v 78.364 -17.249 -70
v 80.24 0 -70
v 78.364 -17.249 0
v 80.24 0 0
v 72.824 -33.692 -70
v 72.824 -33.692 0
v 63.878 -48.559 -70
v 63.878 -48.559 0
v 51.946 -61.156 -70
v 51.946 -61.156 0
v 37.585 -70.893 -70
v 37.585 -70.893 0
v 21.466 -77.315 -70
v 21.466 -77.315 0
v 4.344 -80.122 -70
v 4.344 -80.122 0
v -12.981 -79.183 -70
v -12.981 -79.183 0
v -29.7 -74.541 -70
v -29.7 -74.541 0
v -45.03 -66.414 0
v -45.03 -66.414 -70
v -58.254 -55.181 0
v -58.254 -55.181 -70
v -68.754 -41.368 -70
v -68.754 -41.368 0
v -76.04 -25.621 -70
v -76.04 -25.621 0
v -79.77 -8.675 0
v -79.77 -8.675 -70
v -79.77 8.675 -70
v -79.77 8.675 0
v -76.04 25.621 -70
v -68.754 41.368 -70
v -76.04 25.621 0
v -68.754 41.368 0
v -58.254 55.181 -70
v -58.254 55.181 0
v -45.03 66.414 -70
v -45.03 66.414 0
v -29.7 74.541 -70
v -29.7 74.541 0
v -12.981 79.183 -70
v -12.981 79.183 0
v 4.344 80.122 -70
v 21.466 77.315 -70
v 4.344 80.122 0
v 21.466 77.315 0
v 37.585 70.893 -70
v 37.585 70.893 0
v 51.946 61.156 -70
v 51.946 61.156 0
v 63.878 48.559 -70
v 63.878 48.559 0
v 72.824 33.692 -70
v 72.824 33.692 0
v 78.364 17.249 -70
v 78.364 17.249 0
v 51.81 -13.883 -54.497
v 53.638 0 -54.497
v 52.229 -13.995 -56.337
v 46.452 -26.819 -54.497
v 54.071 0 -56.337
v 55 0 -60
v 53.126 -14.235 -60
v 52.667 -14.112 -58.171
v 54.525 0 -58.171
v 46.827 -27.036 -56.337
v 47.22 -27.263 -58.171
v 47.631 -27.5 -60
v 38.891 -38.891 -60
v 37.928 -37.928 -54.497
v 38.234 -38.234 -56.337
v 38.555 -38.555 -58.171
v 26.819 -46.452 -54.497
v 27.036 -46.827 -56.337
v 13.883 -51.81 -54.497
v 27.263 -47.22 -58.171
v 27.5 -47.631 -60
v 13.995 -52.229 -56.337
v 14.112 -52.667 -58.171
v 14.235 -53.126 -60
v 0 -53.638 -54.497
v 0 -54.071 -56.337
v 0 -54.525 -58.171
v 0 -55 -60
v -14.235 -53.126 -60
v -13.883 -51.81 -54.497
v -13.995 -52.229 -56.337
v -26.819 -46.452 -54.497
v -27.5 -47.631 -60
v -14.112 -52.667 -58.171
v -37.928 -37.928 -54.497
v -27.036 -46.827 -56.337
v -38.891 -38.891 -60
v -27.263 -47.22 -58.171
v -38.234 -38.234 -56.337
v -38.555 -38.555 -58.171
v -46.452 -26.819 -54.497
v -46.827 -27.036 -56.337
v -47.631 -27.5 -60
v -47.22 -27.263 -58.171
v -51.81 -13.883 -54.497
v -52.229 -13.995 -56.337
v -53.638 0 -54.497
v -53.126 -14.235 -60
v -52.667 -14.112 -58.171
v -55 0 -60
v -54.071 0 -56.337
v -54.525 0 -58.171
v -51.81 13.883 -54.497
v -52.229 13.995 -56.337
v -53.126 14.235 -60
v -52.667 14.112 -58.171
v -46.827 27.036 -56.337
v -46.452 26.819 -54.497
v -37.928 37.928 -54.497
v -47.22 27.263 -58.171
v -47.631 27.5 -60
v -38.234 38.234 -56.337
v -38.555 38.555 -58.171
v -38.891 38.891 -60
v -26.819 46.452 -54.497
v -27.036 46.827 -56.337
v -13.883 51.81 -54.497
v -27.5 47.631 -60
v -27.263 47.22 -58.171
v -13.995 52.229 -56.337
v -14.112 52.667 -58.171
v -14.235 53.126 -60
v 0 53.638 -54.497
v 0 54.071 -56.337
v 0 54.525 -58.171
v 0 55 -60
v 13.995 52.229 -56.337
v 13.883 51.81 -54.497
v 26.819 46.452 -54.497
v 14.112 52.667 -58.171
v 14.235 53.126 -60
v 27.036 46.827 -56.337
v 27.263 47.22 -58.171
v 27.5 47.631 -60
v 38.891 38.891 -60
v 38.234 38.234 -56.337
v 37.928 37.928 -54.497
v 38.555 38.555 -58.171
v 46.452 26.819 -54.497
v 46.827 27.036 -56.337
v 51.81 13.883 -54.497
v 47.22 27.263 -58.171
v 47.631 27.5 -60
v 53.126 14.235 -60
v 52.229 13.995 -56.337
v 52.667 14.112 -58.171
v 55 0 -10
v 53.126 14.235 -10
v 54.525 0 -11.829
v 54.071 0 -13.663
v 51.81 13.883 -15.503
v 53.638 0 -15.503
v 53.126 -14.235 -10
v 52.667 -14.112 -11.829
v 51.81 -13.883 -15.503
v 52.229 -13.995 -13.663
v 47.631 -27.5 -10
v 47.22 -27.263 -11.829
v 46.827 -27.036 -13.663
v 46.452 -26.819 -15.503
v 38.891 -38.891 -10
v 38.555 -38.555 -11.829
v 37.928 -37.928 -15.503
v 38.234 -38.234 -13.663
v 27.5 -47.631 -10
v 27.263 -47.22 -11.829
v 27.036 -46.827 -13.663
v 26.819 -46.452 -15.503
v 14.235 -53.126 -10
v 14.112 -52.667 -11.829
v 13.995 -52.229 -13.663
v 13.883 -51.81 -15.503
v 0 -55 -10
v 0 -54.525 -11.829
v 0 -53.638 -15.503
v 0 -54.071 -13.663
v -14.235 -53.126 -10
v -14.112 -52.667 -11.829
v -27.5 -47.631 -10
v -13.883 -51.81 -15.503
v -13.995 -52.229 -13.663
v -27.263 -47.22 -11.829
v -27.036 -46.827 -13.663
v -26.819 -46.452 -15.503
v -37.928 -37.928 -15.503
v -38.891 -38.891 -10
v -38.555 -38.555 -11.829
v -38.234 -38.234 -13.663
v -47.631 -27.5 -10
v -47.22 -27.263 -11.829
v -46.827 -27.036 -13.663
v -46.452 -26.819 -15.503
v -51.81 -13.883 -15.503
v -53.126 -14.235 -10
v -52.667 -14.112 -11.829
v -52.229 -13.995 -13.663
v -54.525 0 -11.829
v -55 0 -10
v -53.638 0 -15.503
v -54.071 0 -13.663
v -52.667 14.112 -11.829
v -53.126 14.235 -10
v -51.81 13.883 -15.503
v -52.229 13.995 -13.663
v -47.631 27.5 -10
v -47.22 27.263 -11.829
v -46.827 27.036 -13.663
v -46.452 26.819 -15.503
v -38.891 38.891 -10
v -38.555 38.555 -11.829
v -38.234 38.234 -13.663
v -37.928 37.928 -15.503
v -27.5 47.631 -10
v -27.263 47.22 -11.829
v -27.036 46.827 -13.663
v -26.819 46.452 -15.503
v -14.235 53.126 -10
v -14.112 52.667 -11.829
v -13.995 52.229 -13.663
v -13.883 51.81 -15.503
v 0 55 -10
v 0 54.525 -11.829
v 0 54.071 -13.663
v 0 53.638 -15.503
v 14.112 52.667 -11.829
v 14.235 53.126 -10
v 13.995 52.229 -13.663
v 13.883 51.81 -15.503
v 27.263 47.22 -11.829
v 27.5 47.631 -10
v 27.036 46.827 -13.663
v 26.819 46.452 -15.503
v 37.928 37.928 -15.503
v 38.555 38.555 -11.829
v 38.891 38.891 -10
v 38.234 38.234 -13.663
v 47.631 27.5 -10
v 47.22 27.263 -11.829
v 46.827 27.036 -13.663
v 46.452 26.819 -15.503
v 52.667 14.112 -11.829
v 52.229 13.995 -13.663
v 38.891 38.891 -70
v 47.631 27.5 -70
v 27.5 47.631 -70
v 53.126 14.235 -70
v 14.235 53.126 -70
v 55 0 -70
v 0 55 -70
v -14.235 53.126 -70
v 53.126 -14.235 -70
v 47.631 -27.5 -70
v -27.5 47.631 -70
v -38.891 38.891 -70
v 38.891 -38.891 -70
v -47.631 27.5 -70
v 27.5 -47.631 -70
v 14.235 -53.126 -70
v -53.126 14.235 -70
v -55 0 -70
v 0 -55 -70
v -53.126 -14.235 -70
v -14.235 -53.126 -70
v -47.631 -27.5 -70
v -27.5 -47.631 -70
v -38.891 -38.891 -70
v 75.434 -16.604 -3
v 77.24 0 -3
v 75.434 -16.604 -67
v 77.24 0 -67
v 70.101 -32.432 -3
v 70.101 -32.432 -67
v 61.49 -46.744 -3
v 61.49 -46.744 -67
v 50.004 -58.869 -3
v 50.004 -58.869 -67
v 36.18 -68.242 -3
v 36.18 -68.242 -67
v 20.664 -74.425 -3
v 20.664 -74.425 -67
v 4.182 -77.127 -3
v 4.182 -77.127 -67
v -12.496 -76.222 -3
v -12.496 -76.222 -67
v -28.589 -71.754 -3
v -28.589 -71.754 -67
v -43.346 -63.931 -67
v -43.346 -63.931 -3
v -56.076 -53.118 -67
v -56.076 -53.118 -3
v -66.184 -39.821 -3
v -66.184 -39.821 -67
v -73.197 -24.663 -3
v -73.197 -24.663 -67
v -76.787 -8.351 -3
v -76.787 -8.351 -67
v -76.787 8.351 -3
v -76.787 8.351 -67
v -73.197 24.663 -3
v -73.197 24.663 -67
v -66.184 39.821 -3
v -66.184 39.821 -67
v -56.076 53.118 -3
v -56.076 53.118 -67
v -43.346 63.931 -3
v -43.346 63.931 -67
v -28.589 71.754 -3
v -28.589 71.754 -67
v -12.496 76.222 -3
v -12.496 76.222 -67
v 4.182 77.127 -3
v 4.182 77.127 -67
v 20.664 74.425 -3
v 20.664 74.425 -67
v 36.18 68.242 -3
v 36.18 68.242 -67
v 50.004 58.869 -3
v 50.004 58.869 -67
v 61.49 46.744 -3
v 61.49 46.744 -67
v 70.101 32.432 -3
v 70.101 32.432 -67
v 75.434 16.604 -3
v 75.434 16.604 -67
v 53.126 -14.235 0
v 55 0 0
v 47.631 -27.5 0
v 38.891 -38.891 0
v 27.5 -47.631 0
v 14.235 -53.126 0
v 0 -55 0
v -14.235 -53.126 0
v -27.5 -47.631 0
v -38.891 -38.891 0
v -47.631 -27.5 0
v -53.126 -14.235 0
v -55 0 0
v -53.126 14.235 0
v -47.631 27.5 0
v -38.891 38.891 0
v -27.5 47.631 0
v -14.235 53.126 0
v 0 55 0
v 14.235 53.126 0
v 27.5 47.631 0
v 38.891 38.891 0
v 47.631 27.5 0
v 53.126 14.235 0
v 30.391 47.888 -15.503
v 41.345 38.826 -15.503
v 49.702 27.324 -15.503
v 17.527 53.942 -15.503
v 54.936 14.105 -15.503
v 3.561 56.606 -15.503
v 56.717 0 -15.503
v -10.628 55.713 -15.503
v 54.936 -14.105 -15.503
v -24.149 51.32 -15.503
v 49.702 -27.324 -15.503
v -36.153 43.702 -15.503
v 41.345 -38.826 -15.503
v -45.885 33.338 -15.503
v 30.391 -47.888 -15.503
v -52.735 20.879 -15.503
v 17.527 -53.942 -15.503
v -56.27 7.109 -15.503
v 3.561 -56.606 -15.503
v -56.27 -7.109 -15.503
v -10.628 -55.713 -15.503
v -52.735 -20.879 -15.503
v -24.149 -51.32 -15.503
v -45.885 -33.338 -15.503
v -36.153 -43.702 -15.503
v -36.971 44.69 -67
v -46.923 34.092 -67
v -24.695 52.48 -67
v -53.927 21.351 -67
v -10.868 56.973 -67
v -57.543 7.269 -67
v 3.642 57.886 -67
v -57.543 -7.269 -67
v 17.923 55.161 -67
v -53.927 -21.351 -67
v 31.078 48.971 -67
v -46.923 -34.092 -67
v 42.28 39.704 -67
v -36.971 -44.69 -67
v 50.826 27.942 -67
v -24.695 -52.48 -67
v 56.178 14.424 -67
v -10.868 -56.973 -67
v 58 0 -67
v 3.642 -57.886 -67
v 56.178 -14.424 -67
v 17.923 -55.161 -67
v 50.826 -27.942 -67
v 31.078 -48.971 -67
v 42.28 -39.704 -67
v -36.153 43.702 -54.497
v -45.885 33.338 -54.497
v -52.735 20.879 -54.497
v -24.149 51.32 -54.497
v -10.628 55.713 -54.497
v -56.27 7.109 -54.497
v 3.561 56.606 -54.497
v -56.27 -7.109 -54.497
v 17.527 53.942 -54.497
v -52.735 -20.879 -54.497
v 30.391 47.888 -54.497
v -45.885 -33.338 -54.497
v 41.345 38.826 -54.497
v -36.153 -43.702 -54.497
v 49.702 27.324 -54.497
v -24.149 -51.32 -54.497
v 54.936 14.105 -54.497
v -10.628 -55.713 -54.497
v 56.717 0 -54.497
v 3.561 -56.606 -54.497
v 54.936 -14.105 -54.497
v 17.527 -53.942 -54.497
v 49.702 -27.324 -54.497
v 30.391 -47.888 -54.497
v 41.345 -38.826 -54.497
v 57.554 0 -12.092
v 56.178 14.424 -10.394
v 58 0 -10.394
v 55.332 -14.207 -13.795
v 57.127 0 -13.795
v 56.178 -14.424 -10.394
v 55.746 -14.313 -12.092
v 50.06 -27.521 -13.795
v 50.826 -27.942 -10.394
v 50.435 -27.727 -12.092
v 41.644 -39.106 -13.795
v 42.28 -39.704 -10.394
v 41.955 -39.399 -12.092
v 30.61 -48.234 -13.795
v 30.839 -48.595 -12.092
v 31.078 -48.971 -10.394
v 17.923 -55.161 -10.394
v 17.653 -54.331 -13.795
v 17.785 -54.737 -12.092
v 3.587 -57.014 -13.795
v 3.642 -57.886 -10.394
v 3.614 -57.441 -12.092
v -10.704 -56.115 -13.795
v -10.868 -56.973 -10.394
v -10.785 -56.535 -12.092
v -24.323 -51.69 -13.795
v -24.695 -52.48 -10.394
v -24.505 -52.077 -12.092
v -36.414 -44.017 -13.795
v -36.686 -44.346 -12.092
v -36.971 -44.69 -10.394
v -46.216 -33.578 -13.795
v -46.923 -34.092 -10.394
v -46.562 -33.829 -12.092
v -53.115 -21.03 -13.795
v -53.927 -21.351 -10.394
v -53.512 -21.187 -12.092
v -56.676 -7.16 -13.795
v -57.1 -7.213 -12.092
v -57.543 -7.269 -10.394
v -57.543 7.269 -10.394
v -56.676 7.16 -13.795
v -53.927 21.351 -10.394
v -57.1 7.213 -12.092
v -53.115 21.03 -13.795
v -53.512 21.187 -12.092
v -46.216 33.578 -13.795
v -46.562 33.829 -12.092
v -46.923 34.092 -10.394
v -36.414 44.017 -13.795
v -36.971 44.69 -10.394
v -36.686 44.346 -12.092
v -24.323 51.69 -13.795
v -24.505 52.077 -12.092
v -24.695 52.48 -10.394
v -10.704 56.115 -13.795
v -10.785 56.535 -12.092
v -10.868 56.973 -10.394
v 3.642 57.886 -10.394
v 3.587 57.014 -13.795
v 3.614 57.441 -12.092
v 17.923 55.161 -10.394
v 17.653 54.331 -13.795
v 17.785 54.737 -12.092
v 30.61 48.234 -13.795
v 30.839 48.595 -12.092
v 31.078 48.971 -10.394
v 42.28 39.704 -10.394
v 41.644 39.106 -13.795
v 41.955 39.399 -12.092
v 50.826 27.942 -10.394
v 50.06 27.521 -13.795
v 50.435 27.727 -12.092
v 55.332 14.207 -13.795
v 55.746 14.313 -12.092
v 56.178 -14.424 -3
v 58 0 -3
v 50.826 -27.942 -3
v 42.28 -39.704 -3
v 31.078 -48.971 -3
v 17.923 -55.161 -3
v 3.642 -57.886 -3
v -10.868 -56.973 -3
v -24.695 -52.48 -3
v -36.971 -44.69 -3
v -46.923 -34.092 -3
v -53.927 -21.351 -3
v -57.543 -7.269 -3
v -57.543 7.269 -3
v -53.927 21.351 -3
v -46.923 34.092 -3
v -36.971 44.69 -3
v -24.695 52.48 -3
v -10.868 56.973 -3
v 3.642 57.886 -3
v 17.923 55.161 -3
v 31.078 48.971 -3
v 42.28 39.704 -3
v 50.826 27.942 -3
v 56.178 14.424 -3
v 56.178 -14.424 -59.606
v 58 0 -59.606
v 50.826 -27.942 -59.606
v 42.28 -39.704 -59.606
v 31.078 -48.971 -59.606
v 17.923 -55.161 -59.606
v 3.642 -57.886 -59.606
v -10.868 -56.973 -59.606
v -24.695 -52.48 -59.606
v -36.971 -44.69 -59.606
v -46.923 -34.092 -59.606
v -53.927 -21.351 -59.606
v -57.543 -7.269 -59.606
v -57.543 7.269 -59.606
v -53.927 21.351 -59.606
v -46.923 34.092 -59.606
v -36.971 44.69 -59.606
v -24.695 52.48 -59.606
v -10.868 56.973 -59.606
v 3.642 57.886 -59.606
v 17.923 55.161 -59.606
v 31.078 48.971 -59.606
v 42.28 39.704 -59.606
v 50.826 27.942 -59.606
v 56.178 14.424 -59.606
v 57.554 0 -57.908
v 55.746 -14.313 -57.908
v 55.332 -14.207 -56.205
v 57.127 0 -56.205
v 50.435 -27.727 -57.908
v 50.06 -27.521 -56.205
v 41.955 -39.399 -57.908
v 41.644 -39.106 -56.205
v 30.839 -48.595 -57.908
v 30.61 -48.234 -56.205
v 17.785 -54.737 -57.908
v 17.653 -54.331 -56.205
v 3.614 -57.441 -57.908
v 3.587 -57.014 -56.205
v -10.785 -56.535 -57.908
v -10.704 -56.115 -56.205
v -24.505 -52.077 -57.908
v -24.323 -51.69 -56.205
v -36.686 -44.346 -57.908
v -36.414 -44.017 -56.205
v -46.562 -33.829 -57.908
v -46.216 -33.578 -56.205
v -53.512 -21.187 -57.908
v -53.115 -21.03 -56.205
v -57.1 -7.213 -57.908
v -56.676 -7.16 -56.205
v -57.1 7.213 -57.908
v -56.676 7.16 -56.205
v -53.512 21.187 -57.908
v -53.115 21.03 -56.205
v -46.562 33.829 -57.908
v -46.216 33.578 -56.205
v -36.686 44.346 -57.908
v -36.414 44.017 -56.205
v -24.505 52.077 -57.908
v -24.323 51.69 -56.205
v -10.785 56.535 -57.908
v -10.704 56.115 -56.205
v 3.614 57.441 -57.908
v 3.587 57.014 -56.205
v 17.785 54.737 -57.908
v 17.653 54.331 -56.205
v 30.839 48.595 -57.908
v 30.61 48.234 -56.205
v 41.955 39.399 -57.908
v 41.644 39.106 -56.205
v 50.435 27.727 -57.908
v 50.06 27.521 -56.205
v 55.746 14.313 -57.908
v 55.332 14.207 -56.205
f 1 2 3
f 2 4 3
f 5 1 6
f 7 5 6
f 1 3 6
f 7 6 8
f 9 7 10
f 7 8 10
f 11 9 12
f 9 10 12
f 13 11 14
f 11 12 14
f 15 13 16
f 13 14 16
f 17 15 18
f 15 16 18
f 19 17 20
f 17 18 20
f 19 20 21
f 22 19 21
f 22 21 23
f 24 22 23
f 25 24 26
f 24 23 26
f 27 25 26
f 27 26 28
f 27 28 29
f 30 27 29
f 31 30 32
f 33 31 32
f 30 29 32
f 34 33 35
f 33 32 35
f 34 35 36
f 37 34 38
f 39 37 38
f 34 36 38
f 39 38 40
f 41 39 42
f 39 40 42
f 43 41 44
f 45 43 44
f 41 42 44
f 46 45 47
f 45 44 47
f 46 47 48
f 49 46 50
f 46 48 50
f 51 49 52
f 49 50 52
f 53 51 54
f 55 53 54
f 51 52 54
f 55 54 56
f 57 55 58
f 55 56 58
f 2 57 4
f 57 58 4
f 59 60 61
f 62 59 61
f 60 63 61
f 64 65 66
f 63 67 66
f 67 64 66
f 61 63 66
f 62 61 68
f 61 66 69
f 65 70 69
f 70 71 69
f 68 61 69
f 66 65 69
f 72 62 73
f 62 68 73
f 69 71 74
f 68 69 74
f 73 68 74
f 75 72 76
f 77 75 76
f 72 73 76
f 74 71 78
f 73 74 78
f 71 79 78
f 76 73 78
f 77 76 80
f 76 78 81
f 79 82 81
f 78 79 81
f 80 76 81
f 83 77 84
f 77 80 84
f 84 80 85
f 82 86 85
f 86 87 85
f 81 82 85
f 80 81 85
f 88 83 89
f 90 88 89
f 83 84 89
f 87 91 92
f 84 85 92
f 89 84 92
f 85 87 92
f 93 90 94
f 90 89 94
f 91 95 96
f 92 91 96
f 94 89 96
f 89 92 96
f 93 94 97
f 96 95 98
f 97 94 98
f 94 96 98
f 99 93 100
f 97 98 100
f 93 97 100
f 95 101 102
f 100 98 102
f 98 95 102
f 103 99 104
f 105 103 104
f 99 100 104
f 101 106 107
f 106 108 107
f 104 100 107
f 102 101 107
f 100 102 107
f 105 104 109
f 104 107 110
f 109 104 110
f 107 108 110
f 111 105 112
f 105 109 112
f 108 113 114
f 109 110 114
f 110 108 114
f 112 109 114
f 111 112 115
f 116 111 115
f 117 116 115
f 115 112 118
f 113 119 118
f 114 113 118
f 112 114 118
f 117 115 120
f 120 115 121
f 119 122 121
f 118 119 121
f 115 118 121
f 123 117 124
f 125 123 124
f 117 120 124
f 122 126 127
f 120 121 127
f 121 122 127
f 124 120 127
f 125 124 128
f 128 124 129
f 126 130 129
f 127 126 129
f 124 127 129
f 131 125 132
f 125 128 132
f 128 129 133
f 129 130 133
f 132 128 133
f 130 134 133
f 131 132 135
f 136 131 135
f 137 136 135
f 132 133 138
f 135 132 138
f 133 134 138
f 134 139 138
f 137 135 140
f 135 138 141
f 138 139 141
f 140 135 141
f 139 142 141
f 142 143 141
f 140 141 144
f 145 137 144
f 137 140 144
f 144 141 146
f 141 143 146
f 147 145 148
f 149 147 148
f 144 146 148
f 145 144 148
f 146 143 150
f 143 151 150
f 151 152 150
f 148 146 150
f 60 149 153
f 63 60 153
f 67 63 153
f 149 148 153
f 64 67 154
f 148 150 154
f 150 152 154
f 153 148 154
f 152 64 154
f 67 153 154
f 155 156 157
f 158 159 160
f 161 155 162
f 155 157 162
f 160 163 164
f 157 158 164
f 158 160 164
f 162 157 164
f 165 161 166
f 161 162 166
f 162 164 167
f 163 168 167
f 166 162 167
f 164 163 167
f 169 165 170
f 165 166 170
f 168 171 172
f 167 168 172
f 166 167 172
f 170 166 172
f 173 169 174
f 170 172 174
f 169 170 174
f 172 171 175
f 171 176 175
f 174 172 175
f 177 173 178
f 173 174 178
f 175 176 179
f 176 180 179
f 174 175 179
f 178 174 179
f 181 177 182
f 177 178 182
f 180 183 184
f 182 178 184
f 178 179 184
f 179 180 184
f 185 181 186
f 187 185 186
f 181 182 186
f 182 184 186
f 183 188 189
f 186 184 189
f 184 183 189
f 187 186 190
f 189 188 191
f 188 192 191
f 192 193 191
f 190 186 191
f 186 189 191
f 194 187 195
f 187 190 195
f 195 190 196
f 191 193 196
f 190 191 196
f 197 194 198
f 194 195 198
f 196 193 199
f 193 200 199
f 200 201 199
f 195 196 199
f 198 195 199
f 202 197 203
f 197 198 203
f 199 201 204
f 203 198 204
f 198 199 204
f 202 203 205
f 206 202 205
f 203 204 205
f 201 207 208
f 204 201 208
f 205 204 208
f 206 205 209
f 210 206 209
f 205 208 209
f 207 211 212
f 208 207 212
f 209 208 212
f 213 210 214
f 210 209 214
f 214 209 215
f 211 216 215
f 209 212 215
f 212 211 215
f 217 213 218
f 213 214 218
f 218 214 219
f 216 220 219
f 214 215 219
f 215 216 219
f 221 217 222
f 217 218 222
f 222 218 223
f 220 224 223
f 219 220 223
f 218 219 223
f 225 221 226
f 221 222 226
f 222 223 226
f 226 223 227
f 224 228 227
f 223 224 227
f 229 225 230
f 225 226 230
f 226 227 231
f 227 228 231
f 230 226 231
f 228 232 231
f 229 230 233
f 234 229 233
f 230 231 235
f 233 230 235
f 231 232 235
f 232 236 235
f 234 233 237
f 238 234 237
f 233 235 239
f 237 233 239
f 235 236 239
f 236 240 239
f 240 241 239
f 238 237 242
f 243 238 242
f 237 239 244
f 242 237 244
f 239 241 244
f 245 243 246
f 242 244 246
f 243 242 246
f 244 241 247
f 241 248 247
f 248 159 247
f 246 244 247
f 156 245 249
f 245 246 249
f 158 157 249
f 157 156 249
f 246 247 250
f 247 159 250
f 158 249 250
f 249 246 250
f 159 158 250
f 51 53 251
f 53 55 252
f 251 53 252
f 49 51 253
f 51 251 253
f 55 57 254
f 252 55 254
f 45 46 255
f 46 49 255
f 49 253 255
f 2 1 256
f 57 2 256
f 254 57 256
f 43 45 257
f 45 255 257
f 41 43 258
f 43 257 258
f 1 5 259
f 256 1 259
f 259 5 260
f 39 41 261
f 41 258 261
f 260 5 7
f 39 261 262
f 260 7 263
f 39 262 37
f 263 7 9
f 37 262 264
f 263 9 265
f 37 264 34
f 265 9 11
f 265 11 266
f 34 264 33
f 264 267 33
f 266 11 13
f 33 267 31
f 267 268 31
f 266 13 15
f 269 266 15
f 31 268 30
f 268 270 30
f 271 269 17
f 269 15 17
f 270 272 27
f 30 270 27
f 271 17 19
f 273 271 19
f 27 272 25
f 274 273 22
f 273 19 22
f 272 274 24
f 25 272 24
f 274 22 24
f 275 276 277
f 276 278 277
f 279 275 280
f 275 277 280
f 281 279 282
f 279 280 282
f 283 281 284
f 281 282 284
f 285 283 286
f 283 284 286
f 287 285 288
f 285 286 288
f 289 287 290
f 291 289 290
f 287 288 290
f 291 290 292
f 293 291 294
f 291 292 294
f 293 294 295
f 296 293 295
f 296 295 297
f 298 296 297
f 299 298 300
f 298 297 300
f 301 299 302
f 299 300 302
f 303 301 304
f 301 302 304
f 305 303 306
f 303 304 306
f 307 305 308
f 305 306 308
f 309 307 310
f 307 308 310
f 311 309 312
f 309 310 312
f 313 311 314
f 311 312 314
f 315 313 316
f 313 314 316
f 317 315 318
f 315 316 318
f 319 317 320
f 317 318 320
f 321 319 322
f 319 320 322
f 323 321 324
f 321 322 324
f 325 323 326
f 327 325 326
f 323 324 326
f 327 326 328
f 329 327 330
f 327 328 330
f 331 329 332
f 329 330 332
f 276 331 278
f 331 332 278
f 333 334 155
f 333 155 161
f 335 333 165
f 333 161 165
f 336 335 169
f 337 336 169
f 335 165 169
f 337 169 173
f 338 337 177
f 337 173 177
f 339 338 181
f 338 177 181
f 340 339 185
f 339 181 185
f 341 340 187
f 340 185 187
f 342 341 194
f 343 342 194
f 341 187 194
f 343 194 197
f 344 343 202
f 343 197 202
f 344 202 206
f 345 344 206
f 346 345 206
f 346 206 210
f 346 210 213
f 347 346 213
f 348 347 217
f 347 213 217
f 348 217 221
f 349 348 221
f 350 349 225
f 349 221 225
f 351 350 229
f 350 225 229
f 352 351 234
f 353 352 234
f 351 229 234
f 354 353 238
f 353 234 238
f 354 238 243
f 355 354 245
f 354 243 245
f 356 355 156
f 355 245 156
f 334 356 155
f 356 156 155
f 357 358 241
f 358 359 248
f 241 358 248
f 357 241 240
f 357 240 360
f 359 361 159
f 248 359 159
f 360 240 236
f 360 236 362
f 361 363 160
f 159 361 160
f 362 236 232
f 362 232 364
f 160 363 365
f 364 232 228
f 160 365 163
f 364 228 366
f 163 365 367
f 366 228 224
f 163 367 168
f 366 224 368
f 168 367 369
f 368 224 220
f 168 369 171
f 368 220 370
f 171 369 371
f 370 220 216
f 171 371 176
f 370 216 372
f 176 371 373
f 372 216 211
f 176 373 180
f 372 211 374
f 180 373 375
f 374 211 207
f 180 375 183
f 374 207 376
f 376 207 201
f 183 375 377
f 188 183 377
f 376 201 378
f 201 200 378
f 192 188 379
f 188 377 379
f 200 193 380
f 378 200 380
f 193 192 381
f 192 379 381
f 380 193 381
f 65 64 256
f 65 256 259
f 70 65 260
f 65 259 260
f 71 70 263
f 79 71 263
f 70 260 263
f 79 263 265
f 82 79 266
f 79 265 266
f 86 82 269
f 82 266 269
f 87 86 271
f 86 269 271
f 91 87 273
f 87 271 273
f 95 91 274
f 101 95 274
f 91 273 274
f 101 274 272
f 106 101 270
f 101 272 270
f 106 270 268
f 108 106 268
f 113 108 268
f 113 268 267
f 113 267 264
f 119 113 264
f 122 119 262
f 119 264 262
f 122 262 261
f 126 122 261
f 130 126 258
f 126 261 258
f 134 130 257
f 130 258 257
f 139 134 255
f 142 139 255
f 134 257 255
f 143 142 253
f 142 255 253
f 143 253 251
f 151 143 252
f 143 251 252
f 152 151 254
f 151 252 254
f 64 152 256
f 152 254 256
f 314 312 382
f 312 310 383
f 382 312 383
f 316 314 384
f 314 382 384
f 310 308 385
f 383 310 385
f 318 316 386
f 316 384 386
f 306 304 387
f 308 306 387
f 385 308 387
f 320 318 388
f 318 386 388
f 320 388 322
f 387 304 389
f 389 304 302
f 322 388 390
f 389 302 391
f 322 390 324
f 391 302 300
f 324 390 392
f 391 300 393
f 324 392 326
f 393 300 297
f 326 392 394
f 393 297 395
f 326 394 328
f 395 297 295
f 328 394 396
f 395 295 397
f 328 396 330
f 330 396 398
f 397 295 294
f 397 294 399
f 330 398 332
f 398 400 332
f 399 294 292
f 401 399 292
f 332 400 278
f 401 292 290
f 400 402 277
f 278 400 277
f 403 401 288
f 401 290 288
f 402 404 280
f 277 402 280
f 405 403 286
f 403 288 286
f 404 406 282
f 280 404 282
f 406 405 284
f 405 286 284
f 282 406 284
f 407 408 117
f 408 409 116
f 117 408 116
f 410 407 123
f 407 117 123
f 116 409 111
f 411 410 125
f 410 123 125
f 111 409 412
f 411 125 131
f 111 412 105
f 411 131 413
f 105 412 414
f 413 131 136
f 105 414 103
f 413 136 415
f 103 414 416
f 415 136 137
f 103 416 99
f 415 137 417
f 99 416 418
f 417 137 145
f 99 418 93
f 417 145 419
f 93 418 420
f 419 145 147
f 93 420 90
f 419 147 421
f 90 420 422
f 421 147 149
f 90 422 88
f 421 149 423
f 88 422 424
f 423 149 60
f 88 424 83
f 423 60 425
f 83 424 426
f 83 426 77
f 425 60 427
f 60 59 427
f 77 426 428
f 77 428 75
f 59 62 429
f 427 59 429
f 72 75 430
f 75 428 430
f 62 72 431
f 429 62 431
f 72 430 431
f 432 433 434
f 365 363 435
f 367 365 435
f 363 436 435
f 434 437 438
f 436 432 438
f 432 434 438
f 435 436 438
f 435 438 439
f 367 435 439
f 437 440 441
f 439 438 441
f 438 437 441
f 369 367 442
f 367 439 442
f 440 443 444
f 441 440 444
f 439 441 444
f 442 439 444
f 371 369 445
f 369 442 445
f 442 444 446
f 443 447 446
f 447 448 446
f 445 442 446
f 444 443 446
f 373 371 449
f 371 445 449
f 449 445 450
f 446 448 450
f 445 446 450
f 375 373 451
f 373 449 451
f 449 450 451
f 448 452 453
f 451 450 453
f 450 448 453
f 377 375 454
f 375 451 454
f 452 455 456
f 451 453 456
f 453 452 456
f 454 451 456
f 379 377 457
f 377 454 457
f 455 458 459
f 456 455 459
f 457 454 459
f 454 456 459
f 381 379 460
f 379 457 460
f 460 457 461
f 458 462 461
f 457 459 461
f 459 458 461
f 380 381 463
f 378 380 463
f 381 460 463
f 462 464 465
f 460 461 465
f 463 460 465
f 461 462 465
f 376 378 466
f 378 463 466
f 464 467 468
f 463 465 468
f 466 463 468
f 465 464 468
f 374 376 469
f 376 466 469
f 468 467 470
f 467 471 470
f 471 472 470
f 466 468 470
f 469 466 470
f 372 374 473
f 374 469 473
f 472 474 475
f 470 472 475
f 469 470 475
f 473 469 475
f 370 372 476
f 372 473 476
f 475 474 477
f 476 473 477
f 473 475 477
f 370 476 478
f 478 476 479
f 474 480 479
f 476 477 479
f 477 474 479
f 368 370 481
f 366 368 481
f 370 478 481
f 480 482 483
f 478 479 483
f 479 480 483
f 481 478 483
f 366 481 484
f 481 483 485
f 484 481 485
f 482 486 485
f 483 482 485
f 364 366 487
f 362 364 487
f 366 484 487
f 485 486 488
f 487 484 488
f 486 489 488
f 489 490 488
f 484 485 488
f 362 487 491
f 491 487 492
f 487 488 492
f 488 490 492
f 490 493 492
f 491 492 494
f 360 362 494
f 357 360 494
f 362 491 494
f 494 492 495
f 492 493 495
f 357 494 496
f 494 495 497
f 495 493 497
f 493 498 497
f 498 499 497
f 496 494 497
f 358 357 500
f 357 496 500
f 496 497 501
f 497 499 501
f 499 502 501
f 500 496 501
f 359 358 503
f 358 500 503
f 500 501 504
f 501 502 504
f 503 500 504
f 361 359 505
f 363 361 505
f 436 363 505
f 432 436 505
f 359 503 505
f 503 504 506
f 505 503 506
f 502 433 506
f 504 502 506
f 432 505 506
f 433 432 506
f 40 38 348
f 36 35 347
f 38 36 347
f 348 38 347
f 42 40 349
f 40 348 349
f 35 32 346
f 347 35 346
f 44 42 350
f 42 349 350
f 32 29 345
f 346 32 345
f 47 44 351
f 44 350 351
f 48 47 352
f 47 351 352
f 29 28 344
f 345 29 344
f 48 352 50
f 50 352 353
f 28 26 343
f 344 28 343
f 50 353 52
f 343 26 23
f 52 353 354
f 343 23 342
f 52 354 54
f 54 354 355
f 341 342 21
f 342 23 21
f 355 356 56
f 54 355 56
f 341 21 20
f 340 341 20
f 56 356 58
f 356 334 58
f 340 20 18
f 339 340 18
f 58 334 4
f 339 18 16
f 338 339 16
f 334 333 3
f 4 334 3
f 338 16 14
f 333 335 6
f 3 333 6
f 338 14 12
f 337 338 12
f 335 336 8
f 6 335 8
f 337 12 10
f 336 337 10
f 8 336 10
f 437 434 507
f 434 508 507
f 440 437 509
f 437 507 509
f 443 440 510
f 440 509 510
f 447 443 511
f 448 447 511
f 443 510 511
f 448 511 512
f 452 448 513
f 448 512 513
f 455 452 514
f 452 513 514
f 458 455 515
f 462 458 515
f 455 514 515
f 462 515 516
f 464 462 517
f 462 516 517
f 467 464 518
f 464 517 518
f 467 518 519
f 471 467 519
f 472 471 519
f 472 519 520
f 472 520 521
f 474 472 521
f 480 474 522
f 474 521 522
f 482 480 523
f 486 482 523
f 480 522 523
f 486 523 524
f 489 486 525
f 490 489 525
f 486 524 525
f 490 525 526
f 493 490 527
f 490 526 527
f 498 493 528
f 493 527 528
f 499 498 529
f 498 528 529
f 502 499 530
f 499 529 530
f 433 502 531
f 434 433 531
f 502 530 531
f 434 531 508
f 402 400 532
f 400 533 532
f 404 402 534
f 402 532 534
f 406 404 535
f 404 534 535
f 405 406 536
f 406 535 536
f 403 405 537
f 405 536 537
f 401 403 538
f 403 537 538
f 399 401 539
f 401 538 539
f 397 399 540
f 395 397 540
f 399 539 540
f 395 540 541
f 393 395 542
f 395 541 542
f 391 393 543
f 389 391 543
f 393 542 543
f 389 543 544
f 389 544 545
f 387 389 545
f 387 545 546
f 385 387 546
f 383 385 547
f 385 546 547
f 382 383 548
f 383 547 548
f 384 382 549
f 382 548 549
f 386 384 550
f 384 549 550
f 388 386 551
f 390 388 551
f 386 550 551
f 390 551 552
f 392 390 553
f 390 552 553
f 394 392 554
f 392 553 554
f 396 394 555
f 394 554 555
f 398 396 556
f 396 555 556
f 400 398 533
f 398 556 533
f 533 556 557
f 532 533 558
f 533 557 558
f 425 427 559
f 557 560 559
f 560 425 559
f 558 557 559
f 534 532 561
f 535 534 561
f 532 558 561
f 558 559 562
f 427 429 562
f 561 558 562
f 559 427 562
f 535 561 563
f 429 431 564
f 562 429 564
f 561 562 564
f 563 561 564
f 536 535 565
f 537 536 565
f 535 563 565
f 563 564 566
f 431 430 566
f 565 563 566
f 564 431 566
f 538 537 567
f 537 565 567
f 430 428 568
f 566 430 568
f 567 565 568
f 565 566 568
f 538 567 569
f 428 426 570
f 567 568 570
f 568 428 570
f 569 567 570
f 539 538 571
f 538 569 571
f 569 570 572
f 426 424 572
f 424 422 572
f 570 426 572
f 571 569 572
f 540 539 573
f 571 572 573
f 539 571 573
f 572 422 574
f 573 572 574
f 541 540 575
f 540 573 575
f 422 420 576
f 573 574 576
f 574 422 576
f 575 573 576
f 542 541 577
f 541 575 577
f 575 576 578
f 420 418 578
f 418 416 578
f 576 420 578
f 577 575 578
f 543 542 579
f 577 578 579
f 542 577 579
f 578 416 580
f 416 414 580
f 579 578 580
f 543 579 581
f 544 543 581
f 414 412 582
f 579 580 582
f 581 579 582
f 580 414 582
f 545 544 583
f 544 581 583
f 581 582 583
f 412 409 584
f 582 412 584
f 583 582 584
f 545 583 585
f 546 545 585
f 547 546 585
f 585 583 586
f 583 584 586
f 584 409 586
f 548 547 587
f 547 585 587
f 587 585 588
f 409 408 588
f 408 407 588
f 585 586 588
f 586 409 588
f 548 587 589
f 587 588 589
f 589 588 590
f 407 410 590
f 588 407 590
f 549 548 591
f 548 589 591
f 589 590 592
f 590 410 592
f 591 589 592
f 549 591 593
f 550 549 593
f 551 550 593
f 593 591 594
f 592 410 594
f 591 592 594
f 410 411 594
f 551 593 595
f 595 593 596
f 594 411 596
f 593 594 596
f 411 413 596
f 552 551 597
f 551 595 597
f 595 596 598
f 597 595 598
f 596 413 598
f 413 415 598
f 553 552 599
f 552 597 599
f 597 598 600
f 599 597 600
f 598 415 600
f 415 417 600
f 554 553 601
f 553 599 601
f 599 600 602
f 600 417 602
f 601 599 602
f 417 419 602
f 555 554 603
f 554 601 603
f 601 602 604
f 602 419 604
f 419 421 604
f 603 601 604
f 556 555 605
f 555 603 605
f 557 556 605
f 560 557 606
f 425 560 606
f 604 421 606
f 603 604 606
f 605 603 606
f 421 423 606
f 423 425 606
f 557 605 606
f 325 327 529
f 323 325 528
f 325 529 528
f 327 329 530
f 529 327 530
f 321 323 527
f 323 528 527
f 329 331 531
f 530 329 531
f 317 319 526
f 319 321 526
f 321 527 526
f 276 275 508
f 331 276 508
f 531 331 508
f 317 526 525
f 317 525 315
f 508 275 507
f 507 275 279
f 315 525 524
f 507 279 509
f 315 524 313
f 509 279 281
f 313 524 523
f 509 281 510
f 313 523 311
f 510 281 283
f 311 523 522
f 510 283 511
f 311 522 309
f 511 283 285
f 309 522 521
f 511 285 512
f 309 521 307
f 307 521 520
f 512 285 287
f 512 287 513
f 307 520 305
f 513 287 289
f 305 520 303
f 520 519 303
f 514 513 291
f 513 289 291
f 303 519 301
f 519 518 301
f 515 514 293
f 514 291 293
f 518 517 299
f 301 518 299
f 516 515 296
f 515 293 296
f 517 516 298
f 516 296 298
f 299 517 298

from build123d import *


with BuildPart() as part:
    # 草圖4 → 旋轉1 (revolve)
    with BuildSketch(Plane(origin=(0, 0, 0), x_dir=(0, 0, -1), z_dir=(1, 0, 0)), mode=Mode.PRIVATE) as revolve_1_sk:
        with BuildLine():
            Line((0, 55), (10, 55))
            ThreePointArc((10, 55), (12.745508857, 54.295513936), (15.502645054, 53.638003865))
            Line((15.502645054, 53.638003865), (15.502645054, 56.7174692))
            ThreePointArc((15.502645054, 56.7174692), (12.942937744, 57.338097036), (10.393591772, 58))
            Line((10.393591772, 58), (3, 58))
            Line((3, 58), (3, 77.239932534))
            Line((3, 77.239932534), (67, 77.239932534))
            Line((67, 77.239932534), (67, 58))
            Line((67, 58), (59.606408228, 58))
            ThreePointArc((59.606408228, 58), (57.057062256, 57.338097036), (54.497354946, 56.7174692))
            Line((54.497354946, 56.7174692), (54.497354946, 53.638003865))
            ThreePointArc((54.497354946, 53.638003865), (57.254491143, 54.295513936), (60, 55))
            Line((60, 55), (70, 55))
            Line((70, 55), (70, 80.239932534))
            Line((70, 80.239932534), (0, 80.239932534))
            Line((0, 80.239932534), (0, 55))
        make_face()
    revolve(revolve_1_sk.sketch.rotate(Axis((0, 0, 0), (0, 0, -1)), 90), axis=Axis((0, 0, 0), (0, 0, -1)))


solid = part.part
